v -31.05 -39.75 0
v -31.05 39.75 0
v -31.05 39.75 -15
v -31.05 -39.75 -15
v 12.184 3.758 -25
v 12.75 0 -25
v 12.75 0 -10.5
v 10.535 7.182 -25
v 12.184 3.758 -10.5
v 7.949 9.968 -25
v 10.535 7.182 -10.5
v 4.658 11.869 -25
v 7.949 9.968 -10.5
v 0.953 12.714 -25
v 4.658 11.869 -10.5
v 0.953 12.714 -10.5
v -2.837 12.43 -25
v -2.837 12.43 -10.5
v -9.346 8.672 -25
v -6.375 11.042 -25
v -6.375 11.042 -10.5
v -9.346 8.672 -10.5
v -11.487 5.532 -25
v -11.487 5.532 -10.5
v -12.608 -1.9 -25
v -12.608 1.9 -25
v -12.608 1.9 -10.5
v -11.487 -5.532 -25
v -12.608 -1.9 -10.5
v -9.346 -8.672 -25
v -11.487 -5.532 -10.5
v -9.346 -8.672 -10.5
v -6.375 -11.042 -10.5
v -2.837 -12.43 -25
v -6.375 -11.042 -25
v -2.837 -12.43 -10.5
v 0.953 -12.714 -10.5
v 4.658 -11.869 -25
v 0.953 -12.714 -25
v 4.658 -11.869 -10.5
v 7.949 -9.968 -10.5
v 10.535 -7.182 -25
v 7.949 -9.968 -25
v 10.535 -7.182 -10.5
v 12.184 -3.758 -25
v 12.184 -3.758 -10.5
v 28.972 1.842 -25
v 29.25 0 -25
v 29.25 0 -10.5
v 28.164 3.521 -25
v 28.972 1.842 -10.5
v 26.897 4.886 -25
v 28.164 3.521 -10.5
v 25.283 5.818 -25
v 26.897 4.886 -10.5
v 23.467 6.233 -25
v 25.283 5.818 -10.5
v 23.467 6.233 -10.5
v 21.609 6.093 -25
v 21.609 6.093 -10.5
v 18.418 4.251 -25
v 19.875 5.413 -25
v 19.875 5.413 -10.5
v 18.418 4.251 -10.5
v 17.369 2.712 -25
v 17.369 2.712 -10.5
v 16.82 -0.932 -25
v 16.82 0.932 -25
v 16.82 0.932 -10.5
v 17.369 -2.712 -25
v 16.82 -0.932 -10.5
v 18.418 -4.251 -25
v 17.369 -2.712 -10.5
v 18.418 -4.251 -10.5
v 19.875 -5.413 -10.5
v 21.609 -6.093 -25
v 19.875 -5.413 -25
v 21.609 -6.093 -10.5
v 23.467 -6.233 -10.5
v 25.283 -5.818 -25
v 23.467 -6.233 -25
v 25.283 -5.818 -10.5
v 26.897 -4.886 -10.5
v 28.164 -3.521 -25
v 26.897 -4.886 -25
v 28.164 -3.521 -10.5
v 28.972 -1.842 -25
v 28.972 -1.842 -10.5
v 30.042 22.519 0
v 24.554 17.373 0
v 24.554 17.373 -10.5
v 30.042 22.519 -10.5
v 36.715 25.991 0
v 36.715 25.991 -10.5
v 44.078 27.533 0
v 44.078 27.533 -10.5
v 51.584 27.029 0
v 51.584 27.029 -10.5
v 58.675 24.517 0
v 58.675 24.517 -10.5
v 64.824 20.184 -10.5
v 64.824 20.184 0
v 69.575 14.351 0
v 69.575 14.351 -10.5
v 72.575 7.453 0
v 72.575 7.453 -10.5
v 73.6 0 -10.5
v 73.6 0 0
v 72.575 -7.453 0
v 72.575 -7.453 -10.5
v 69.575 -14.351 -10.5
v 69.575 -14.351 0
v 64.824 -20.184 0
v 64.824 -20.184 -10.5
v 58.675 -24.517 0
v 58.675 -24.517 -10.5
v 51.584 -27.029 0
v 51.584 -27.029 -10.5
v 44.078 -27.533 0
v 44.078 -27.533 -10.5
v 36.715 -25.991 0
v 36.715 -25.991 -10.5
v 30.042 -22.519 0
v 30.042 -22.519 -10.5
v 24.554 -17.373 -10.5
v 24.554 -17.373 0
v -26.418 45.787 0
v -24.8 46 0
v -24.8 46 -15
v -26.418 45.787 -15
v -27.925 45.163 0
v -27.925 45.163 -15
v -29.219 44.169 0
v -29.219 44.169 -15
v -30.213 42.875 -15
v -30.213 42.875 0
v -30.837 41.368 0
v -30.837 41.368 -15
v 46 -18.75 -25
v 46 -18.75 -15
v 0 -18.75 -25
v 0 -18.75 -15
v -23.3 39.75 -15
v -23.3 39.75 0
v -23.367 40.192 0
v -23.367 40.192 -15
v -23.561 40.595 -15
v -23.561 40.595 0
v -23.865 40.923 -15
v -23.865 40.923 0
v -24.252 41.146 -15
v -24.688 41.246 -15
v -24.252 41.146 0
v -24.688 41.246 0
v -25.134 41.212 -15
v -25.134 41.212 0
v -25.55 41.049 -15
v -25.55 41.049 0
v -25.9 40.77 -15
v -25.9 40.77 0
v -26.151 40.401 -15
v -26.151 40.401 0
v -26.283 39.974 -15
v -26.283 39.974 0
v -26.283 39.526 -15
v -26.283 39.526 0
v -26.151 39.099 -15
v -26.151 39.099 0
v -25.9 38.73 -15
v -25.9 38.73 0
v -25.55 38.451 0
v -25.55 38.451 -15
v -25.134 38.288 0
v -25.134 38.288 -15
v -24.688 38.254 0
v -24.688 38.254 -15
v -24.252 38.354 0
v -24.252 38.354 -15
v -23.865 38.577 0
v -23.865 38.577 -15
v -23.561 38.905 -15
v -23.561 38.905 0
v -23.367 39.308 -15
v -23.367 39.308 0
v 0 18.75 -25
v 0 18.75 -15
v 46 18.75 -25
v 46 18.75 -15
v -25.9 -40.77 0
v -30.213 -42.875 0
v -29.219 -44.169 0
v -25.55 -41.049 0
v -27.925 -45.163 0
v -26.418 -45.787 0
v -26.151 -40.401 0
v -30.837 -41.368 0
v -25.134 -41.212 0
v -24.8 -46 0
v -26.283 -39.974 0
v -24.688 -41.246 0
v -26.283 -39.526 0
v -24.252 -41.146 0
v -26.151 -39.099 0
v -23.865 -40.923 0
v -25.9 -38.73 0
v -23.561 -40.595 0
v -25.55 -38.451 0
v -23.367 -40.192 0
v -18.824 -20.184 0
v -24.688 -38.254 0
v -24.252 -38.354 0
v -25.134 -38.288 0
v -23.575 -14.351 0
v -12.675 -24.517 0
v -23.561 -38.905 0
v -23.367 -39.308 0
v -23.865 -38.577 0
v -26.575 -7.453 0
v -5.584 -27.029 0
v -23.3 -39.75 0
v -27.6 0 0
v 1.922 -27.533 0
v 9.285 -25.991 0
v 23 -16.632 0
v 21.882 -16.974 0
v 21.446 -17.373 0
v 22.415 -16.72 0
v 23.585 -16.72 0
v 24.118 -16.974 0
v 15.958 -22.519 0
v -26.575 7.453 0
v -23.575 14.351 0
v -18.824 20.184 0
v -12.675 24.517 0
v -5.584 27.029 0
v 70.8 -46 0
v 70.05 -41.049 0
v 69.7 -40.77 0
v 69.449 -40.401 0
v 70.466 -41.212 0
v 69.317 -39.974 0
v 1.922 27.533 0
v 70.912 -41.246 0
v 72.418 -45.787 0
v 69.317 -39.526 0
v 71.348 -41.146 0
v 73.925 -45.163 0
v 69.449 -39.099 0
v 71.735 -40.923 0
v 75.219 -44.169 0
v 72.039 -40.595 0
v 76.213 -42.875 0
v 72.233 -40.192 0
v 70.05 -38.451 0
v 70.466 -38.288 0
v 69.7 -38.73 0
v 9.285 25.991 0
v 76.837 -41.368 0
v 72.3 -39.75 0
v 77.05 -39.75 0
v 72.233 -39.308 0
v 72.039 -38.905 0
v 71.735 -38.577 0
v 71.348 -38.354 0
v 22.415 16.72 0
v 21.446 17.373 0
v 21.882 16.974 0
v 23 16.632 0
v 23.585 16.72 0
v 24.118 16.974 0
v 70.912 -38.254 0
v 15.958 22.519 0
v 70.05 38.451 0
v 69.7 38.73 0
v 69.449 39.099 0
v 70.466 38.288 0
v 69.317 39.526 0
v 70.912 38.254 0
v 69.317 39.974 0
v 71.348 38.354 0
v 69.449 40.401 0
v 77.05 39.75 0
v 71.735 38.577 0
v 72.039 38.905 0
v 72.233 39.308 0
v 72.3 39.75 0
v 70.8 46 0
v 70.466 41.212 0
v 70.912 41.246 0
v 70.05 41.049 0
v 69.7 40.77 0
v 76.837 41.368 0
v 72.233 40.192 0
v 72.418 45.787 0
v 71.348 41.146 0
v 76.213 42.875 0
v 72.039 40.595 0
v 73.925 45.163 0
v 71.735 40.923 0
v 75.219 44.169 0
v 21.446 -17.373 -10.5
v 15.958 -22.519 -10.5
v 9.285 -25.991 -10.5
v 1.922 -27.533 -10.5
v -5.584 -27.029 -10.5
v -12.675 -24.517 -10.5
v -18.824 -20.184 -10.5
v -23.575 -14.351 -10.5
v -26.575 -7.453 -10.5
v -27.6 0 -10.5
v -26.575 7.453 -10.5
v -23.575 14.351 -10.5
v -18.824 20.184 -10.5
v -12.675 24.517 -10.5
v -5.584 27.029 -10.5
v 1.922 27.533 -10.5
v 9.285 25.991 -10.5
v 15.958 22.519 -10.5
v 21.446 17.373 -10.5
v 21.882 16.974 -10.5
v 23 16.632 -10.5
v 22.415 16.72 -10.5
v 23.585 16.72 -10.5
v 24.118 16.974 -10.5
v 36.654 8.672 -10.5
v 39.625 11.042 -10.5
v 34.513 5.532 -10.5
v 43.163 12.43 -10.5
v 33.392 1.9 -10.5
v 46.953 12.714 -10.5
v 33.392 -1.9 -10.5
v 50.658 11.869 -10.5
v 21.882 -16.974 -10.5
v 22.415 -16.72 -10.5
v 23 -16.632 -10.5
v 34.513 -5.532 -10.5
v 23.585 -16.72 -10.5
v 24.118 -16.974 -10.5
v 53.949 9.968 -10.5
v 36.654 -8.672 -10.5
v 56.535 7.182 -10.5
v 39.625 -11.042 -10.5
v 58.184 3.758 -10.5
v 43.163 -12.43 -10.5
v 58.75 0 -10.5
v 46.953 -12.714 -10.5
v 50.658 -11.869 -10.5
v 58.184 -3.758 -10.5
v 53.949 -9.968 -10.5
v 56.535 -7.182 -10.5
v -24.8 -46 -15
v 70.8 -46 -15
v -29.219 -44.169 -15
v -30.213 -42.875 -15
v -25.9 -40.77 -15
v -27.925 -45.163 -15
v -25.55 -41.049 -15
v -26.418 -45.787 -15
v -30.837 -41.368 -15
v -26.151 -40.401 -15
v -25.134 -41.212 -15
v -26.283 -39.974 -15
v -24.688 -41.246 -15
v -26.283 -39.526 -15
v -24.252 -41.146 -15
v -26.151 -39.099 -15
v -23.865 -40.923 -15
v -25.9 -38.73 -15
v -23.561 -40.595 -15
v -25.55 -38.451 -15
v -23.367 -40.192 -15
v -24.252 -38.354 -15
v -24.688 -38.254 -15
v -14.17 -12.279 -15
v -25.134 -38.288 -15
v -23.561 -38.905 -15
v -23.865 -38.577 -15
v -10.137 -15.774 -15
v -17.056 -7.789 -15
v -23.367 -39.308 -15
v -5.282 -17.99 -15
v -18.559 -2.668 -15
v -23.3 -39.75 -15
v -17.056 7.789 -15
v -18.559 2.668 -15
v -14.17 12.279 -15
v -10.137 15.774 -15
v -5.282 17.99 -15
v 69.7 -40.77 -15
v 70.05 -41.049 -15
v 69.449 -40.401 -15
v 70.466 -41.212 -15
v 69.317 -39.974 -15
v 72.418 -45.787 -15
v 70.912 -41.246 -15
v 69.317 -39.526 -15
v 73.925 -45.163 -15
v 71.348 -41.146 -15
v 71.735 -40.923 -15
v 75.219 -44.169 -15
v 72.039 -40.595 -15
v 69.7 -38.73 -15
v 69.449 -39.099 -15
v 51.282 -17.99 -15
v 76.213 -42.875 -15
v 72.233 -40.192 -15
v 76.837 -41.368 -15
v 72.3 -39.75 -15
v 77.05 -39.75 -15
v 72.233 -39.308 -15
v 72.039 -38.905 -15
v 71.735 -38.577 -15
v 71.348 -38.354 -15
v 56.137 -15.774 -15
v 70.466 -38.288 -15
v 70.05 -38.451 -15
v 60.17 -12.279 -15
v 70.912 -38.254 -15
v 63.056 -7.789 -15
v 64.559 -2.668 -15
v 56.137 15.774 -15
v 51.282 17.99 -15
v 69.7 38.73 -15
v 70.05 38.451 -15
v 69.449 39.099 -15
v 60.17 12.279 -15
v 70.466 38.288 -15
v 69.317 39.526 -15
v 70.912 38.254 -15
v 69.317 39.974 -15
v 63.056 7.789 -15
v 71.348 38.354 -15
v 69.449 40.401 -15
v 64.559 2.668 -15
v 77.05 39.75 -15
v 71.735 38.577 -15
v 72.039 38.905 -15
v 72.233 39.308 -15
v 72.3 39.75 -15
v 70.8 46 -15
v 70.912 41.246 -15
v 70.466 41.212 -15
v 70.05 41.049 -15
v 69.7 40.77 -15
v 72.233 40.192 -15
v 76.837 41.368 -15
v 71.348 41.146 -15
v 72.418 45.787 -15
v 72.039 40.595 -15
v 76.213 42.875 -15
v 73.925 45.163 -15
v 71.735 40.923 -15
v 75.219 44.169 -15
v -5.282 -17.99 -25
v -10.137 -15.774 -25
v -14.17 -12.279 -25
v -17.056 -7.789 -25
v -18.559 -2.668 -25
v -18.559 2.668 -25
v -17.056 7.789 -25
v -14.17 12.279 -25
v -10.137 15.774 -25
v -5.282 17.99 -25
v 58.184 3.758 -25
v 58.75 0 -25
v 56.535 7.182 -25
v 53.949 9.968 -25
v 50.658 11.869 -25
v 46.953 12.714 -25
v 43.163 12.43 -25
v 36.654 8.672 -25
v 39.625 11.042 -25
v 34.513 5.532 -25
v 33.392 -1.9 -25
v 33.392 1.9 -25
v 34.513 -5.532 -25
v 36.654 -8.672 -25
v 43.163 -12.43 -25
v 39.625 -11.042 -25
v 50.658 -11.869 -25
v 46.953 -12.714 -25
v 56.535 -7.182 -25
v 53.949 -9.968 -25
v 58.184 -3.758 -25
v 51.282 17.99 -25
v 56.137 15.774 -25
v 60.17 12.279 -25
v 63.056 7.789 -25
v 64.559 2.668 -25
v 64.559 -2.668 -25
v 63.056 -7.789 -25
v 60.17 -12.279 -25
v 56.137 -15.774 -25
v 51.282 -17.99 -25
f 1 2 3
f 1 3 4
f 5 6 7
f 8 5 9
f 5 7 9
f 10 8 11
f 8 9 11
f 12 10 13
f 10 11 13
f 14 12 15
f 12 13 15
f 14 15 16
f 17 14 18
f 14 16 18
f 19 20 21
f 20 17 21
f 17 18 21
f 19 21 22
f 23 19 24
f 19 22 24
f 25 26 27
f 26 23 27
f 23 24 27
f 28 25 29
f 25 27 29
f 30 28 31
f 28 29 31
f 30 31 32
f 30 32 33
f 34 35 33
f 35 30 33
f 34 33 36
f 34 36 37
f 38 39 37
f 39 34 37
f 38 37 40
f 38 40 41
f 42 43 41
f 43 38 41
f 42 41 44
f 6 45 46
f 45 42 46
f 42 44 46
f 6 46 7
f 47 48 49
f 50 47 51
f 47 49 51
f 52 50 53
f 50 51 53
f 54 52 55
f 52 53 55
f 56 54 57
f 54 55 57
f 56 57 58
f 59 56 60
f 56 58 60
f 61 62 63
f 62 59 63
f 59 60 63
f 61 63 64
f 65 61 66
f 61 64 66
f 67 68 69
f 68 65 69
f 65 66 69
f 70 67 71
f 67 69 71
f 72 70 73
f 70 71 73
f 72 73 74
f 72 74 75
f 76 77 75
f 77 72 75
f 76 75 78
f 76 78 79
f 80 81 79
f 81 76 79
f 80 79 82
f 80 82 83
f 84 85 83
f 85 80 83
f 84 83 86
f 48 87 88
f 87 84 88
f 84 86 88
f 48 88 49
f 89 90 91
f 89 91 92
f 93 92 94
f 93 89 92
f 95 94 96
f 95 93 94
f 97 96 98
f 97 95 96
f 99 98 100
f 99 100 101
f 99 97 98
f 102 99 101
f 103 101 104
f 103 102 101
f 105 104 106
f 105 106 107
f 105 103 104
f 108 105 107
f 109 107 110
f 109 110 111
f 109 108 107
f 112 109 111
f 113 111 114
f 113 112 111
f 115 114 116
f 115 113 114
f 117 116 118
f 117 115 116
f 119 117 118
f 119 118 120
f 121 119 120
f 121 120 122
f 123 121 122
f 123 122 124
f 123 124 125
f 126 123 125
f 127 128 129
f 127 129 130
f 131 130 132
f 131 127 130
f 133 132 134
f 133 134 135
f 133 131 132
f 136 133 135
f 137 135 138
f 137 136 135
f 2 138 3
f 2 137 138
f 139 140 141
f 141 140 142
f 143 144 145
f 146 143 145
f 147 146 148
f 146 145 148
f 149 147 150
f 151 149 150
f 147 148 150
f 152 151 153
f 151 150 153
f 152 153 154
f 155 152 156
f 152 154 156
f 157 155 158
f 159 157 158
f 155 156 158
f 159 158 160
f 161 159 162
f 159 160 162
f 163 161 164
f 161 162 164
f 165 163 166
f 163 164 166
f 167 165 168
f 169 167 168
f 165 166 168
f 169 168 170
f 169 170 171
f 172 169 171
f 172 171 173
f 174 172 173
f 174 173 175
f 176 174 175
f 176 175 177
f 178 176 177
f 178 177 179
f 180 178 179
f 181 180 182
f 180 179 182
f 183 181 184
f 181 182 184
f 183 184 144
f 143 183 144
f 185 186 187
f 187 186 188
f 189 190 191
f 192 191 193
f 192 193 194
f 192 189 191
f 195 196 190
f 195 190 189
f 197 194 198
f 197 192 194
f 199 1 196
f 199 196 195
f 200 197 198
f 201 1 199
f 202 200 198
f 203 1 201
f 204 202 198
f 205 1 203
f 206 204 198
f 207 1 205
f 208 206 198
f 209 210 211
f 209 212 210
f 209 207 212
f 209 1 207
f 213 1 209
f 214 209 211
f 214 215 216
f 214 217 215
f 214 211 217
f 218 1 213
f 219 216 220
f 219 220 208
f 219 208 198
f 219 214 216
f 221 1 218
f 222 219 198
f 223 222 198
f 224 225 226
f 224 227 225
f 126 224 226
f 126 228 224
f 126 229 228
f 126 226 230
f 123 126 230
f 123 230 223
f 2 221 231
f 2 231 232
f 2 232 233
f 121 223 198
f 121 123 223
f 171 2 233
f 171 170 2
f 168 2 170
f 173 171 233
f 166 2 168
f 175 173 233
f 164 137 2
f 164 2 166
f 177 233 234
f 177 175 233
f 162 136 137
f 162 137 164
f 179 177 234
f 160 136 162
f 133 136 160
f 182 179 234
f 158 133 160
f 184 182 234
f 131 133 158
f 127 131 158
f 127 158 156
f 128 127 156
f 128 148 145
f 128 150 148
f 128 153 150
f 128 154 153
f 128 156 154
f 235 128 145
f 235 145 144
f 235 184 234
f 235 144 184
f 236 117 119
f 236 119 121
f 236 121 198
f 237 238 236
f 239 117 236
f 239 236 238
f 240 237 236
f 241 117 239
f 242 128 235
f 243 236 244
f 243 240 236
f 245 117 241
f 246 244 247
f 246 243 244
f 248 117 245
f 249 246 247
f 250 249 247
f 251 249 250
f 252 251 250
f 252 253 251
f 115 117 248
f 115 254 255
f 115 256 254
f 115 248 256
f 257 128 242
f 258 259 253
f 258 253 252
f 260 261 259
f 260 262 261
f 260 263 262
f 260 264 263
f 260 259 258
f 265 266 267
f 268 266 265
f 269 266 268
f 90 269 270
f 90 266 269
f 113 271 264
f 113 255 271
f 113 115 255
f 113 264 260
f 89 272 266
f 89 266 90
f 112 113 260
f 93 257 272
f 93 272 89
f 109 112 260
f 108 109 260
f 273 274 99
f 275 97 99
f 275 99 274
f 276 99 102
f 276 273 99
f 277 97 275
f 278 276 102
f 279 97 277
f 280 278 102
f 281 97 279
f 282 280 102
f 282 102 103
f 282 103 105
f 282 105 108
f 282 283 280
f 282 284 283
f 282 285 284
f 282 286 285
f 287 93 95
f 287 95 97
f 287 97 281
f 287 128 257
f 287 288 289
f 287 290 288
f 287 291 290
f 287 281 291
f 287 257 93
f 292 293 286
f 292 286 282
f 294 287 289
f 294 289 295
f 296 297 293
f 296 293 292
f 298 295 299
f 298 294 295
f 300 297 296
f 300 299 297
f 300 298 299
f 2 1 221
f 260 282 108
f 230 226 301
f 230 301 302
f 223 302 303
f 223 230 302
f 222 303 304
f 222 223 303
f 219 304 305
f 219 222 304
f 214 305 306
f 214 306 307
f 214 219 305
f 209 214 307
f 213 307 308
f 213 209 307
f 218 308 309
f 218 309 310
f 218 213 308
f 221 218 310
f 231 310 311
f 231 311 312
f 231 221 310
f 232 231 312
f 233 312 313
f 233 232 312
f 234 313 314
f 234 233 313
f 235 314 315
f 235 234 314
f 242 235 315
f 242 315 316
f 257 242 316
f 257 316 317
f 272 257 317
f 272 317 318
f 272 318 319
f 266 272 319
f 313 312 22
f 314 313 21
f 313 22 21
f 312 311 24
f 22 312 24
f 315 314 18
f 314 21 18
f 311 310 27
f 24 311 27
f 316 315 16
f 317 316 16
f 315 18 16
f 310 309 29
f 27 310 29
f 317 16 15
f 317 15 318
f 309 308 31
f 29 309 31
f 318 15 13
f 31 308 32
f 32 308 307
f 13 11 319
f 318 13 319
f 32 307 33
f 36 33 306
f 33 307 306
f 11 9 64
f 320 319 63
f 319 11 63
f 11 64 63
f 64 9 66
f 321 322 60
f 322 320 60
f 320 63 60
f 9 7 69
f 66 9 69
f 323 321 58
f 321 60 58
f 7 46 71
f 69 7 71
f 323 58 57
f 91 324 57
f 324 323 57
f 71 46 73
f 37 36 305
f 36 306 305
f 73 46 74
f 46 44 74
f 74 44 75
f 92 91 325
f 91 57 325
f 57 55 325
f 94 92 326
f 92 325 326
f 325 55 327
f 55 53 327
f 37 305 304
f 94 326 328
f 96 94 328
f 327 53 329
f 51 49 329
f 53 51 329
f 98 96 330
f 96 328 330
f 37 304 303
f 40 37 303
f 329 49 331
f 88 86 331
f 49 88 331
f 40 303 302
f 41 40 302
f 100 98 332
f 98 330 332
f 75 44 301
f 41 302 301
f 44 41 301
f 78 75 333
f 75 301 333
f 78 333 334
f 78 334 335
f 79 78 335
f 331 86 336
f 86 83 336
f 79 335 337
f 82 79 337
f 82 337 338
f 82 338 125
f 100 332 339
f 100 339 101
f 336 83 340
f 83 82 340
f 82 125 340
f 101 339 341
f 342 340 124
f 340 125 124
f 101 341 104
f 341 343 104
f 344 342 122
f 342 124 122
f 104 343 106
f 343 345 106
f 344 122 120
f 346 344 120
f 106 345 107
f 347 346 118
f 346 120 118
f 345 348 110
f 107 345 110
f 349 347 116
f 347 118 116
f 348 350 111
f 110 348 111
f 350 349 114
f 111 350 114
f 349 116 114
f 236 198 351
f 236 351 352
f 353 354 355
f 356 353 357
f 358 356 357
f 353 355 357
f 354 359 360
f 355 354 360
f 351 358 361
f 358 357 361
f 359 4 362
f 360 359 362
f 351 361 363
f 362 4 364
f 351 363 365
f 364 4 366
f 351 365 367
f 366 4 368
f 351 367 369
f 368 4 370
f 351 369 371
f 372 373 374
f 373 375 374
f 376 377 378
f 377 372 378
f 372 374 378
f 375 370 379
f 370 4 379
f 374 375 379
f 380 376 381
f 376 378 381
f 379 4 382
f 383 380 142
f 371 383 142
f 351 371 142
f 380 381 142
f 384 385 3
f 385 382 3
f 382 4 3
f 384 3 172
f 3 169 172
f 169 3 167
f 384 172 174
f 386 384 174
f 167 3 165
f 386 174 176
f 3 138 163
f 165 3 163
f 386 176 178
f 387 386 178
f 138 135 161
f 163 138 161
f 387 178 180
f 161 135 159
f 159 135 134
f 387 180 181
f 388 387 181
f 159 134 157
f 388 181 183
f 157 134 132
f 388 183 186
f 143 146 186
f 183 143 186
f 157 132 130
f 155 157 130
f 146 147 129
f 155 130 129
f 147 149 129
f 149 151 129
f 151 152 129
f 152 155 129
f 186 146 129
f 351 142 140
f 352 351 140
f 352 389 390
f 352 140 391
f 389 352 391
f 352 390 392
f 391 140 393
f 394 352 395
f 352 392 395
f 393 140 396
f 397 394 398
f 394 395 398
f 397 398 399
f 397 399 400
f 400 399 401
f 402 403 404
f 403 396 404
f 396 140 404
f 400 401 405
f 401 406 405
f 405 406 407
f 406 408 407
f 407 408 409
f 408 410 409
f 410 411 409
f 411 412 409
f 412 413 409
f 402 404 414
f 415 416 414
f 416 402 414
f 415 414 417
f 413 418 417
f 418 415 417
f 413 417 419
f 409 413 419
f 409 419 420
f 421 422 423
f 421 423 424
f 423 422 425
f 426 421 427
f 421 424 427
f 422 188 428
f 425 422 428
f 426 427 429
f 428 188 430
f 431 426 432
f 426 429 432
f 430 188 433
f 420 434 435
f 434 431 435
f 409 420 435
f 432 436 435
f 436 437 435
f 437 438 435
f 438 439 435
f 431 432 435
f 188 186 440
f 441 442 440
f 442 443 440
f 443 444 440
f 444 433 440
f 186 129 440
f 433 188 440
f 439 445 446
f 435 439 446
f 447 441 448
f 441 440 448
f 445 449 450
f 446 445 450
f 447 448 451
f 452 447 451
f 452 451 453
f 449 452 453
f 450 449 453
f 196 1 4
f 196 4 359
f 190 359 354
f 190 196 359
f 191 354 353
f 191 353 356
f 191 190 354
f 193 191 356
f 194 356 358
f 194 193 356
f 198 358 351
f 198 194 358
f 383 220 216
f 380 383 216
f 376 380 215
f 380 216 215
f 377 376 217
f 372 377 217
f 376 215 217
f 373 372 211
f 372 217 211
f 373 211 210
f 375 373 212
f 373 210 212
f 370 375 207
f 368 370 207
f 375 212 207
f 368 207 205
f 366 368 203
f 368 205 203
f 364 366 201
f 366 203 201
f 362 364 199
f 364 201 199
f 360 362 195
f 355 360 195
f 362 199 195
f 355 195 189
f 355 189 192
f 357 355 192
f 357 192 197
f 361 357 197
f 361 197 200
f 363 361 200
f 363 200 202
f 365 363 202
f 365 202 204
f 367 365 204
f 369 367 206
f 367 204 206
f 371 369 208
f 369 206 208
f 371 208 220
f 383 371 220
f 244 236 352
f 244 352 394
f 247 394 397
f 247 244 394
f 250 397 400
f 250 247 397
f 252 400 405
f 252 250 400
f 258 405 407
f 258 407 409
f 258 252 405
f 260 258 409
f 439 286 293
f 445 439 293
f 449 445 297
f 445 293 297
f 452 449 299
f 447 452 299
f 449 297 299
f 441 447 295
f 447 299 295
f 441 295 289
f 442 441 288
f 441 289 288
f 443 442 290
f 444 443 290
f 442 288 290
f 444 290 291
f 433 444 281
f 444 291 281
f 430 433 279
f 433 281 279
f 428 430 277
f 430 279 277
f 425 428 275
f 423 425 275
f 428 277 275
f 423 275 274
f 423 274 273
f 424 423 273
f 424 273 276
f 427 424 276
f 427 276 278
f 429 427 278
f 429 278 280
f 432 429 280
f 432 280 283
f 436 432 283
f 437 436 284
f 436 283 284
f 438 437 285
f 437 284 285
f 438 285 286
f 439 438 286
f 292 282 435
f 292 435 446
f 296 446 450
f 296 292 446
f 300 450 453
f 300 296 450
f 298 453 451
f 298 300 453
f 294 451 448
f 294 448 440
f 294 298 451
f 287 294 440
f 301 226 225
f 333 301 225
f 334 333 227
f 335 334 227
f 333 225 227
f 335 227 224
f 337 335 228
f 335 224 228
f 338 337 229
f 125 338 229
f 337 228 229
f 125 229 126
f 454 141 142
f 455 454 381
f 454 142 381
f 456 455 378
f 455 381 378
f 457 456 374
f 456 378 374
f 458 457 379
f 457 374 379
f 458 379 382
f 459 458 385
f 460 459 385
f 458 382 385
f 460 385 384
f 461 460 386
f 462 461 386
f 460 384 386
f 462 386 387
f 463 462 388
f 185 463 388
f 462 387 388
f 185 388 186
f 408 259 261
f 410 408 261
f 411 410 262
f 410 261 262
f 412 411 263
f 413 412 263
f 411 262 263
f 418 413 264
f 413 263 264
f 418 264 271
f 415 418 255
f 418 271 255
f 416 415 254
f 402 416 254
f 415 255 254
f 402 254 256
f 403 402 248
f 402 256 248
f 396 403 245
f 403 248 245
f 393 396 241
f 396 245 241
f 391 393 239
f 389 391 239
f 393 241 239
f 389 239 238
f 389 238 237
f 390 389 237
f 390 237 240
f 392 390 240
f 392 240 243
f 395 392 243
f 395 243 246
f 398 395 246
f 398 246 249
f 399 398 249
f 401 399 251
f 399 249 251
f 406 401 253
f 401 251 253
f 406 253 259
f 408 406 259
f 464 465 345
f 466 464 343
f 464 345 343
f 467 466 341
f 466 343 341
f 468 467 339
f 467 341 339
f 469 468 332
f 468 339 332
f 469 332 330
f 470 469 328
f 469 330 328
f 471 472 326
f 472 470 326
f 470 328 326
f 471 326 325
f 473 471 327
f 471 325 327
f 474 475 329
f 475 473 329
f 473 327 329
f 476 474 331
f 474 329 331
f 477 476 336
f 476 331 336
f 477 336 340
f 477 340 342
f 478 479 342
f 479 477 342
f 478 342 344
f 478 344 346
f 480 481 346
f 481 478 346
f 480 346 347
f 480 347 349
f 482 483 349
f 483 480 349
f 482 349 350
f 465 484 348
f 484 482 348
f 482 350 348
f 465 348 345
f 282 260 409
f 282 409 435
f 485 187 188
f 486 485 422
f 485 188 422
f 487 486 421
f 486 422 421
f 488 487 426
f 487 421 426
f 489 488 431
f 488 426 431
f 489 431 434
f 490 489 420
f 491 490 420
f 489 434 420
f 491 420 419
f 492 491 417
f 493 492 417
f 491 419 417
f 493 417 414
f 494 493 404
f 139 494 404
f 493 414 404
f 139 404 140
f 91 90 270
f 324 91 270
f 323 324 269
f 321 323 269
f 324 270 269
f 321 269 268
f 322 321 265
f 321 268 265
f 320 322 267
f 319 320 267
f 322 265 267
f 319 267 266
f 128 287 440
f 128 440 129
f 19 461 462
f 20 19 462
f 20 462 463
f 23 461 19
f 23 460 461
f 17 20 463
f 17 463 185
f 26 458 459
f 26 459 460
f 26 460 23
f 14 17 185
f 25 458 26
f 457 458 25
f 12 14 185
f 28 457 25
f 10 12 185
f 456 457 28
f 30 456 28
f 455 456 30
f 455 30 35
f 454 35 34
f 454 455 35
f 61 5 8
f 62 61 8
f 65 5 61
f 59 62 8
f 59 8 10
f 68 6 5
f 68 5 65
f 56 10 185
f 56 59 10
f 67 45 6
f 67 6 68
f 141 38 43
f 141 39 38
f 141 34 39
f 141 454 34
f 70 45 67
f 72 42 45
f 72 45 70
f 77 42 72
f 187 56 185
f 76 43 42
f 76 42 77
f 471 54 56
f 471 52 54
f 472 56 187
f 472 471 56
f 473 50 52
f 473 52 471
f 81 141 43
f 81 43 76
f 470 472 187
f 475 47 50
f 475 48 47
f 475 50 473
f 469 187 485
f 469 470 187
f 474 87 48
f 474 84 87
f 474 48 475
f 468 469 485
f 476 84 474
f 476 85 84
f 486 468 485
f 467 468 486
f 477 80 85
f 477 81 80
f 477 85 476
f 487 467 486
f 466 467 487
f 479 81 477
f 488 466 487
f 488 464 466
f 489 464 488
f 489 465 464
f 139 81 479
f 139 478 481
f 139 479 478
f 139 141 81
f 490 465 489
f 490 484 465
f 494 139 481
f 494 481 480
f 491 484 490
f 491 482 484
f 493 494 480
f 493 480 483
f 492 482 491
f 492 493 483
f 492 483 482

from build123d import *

# Parameters (mm, degrees)
SKETCH074_R     = 1.5
SKETCH074_R_2   = 12.75
SKETCH074_R_3   = 6.25
PAD042_DEPTH    = 15
SKETCH060_R     = 12.75
SKETCH060_R_2   = 6.25
PAD043_DEPTH    = 25
POCKET036_DEPTH = 10.5


with BuildPart() as part:
    # Sketch074 → Pad042 (new body)
    with BuildSketch(Plane.XY):
        with BuildLine():
            ThreePointArc((-24.8, 46), (-29.219417, 44.169417), (-31.05, 39.75))
            Line((-31.05, 39.75), (-31.05, -39.75))
            ThreePointArc((-31.05, -39.75), (-29.219417, -44.169417), (-24.8, -46))
            Line((-24.8, -46), (70.8, -46))
            ThreePointArc((70.8, -46), (75.219417, -44.169417), (77.05, -39.75))
            Line((77.05, -39.75), (77.05, 39.75))
            ThreePointArc((77.05, 39.75), (75.219417, 44.169417), (70.8, 46))
            Line((70.8, 46), (-24.8, 46))
        make_face()
        with Locations((-24.8, 39.75)):
            Circle(SKETCH074_R, mode=Mode.SUBTRACT)
        with Locations((70.8, 39.75)):
            Circle(SKETCH074_R, mode=Mode.SUBTRACT)
        with Locations((-24.8, -39.75)):
            Circle(SKETCH074_R, mode=Mode.SUBTRACT)
        with Locations((70.8, -39.75)):
            Circle(SKETCH074_R, mode=Mode.SUBTRACT)
        Circle(SKETCH074_R_2, mode=Mode.SUBTRACT)
        with Locations((46, 0)):
            Circle(SKETCH074_R_2, mode=Mode.SUBTRACT)
        with Locations((23, 0)):
            Circle(SKETCH074_R_3, mode=Mode.SUBTRACT)
    extrude(amount=-PAD042_DEPTH)

    # Sketch060 → Pad043 (join)
    with BuildSketch(Plane(origin=(0, 0, 0), x_dir=(1, 0, 0), z_dir=(0, 0, -1))):
        with BuildLine():
            ThreePointArc((0, 18.75), (-18.75, 0), (0, -18.75))
            Line((0, -18.75), (46, -18.75))
            ThreePointArc((46, -18.75), (64.75, 0), (46, 18.75))
            Line((46, 18.75), (0, 18.75))
        make_face()
        Circle(SKETCH060_R, mode=Mode.SUBTRACT)
        with Locations((46, 0)):
            Circle(SKETCH060_R, mode=Mode.SUBTRACT)
        with Locations((23, 0)):
            Circle(SKETCH060_R_2, mode=Mode.SUBTRACT)
    extrude(amount=PAD043_DEPTH)

    # Sketch064 → Pocket036 (cut)
    with BuildSketch(Plane(origin=(0, 0, 0), x_dir=(1, 0, 0), z_dir=(0, 0, -1))):
        with BuildLine():
            ThreePointArc((21.445946, 17.373296), (-27.6, 0), (21.445946, -17.373296))
            ThreePointArc((24.554054, -17.373296), (23, -16.63223), (21.445946, -17.373296))
            ThreePointArc((24.554054, -17.373296), (73.6, 0), (24.554054, 17.373296))
            ThreePointArc((21.445946, 17.373296), (23, 16.63223), (24.554054, 17.373296))
        make_face()
    extrude(amount=POCKET036_DEPTH, mode=Mode.SUBTRACT)


solid = part.part
